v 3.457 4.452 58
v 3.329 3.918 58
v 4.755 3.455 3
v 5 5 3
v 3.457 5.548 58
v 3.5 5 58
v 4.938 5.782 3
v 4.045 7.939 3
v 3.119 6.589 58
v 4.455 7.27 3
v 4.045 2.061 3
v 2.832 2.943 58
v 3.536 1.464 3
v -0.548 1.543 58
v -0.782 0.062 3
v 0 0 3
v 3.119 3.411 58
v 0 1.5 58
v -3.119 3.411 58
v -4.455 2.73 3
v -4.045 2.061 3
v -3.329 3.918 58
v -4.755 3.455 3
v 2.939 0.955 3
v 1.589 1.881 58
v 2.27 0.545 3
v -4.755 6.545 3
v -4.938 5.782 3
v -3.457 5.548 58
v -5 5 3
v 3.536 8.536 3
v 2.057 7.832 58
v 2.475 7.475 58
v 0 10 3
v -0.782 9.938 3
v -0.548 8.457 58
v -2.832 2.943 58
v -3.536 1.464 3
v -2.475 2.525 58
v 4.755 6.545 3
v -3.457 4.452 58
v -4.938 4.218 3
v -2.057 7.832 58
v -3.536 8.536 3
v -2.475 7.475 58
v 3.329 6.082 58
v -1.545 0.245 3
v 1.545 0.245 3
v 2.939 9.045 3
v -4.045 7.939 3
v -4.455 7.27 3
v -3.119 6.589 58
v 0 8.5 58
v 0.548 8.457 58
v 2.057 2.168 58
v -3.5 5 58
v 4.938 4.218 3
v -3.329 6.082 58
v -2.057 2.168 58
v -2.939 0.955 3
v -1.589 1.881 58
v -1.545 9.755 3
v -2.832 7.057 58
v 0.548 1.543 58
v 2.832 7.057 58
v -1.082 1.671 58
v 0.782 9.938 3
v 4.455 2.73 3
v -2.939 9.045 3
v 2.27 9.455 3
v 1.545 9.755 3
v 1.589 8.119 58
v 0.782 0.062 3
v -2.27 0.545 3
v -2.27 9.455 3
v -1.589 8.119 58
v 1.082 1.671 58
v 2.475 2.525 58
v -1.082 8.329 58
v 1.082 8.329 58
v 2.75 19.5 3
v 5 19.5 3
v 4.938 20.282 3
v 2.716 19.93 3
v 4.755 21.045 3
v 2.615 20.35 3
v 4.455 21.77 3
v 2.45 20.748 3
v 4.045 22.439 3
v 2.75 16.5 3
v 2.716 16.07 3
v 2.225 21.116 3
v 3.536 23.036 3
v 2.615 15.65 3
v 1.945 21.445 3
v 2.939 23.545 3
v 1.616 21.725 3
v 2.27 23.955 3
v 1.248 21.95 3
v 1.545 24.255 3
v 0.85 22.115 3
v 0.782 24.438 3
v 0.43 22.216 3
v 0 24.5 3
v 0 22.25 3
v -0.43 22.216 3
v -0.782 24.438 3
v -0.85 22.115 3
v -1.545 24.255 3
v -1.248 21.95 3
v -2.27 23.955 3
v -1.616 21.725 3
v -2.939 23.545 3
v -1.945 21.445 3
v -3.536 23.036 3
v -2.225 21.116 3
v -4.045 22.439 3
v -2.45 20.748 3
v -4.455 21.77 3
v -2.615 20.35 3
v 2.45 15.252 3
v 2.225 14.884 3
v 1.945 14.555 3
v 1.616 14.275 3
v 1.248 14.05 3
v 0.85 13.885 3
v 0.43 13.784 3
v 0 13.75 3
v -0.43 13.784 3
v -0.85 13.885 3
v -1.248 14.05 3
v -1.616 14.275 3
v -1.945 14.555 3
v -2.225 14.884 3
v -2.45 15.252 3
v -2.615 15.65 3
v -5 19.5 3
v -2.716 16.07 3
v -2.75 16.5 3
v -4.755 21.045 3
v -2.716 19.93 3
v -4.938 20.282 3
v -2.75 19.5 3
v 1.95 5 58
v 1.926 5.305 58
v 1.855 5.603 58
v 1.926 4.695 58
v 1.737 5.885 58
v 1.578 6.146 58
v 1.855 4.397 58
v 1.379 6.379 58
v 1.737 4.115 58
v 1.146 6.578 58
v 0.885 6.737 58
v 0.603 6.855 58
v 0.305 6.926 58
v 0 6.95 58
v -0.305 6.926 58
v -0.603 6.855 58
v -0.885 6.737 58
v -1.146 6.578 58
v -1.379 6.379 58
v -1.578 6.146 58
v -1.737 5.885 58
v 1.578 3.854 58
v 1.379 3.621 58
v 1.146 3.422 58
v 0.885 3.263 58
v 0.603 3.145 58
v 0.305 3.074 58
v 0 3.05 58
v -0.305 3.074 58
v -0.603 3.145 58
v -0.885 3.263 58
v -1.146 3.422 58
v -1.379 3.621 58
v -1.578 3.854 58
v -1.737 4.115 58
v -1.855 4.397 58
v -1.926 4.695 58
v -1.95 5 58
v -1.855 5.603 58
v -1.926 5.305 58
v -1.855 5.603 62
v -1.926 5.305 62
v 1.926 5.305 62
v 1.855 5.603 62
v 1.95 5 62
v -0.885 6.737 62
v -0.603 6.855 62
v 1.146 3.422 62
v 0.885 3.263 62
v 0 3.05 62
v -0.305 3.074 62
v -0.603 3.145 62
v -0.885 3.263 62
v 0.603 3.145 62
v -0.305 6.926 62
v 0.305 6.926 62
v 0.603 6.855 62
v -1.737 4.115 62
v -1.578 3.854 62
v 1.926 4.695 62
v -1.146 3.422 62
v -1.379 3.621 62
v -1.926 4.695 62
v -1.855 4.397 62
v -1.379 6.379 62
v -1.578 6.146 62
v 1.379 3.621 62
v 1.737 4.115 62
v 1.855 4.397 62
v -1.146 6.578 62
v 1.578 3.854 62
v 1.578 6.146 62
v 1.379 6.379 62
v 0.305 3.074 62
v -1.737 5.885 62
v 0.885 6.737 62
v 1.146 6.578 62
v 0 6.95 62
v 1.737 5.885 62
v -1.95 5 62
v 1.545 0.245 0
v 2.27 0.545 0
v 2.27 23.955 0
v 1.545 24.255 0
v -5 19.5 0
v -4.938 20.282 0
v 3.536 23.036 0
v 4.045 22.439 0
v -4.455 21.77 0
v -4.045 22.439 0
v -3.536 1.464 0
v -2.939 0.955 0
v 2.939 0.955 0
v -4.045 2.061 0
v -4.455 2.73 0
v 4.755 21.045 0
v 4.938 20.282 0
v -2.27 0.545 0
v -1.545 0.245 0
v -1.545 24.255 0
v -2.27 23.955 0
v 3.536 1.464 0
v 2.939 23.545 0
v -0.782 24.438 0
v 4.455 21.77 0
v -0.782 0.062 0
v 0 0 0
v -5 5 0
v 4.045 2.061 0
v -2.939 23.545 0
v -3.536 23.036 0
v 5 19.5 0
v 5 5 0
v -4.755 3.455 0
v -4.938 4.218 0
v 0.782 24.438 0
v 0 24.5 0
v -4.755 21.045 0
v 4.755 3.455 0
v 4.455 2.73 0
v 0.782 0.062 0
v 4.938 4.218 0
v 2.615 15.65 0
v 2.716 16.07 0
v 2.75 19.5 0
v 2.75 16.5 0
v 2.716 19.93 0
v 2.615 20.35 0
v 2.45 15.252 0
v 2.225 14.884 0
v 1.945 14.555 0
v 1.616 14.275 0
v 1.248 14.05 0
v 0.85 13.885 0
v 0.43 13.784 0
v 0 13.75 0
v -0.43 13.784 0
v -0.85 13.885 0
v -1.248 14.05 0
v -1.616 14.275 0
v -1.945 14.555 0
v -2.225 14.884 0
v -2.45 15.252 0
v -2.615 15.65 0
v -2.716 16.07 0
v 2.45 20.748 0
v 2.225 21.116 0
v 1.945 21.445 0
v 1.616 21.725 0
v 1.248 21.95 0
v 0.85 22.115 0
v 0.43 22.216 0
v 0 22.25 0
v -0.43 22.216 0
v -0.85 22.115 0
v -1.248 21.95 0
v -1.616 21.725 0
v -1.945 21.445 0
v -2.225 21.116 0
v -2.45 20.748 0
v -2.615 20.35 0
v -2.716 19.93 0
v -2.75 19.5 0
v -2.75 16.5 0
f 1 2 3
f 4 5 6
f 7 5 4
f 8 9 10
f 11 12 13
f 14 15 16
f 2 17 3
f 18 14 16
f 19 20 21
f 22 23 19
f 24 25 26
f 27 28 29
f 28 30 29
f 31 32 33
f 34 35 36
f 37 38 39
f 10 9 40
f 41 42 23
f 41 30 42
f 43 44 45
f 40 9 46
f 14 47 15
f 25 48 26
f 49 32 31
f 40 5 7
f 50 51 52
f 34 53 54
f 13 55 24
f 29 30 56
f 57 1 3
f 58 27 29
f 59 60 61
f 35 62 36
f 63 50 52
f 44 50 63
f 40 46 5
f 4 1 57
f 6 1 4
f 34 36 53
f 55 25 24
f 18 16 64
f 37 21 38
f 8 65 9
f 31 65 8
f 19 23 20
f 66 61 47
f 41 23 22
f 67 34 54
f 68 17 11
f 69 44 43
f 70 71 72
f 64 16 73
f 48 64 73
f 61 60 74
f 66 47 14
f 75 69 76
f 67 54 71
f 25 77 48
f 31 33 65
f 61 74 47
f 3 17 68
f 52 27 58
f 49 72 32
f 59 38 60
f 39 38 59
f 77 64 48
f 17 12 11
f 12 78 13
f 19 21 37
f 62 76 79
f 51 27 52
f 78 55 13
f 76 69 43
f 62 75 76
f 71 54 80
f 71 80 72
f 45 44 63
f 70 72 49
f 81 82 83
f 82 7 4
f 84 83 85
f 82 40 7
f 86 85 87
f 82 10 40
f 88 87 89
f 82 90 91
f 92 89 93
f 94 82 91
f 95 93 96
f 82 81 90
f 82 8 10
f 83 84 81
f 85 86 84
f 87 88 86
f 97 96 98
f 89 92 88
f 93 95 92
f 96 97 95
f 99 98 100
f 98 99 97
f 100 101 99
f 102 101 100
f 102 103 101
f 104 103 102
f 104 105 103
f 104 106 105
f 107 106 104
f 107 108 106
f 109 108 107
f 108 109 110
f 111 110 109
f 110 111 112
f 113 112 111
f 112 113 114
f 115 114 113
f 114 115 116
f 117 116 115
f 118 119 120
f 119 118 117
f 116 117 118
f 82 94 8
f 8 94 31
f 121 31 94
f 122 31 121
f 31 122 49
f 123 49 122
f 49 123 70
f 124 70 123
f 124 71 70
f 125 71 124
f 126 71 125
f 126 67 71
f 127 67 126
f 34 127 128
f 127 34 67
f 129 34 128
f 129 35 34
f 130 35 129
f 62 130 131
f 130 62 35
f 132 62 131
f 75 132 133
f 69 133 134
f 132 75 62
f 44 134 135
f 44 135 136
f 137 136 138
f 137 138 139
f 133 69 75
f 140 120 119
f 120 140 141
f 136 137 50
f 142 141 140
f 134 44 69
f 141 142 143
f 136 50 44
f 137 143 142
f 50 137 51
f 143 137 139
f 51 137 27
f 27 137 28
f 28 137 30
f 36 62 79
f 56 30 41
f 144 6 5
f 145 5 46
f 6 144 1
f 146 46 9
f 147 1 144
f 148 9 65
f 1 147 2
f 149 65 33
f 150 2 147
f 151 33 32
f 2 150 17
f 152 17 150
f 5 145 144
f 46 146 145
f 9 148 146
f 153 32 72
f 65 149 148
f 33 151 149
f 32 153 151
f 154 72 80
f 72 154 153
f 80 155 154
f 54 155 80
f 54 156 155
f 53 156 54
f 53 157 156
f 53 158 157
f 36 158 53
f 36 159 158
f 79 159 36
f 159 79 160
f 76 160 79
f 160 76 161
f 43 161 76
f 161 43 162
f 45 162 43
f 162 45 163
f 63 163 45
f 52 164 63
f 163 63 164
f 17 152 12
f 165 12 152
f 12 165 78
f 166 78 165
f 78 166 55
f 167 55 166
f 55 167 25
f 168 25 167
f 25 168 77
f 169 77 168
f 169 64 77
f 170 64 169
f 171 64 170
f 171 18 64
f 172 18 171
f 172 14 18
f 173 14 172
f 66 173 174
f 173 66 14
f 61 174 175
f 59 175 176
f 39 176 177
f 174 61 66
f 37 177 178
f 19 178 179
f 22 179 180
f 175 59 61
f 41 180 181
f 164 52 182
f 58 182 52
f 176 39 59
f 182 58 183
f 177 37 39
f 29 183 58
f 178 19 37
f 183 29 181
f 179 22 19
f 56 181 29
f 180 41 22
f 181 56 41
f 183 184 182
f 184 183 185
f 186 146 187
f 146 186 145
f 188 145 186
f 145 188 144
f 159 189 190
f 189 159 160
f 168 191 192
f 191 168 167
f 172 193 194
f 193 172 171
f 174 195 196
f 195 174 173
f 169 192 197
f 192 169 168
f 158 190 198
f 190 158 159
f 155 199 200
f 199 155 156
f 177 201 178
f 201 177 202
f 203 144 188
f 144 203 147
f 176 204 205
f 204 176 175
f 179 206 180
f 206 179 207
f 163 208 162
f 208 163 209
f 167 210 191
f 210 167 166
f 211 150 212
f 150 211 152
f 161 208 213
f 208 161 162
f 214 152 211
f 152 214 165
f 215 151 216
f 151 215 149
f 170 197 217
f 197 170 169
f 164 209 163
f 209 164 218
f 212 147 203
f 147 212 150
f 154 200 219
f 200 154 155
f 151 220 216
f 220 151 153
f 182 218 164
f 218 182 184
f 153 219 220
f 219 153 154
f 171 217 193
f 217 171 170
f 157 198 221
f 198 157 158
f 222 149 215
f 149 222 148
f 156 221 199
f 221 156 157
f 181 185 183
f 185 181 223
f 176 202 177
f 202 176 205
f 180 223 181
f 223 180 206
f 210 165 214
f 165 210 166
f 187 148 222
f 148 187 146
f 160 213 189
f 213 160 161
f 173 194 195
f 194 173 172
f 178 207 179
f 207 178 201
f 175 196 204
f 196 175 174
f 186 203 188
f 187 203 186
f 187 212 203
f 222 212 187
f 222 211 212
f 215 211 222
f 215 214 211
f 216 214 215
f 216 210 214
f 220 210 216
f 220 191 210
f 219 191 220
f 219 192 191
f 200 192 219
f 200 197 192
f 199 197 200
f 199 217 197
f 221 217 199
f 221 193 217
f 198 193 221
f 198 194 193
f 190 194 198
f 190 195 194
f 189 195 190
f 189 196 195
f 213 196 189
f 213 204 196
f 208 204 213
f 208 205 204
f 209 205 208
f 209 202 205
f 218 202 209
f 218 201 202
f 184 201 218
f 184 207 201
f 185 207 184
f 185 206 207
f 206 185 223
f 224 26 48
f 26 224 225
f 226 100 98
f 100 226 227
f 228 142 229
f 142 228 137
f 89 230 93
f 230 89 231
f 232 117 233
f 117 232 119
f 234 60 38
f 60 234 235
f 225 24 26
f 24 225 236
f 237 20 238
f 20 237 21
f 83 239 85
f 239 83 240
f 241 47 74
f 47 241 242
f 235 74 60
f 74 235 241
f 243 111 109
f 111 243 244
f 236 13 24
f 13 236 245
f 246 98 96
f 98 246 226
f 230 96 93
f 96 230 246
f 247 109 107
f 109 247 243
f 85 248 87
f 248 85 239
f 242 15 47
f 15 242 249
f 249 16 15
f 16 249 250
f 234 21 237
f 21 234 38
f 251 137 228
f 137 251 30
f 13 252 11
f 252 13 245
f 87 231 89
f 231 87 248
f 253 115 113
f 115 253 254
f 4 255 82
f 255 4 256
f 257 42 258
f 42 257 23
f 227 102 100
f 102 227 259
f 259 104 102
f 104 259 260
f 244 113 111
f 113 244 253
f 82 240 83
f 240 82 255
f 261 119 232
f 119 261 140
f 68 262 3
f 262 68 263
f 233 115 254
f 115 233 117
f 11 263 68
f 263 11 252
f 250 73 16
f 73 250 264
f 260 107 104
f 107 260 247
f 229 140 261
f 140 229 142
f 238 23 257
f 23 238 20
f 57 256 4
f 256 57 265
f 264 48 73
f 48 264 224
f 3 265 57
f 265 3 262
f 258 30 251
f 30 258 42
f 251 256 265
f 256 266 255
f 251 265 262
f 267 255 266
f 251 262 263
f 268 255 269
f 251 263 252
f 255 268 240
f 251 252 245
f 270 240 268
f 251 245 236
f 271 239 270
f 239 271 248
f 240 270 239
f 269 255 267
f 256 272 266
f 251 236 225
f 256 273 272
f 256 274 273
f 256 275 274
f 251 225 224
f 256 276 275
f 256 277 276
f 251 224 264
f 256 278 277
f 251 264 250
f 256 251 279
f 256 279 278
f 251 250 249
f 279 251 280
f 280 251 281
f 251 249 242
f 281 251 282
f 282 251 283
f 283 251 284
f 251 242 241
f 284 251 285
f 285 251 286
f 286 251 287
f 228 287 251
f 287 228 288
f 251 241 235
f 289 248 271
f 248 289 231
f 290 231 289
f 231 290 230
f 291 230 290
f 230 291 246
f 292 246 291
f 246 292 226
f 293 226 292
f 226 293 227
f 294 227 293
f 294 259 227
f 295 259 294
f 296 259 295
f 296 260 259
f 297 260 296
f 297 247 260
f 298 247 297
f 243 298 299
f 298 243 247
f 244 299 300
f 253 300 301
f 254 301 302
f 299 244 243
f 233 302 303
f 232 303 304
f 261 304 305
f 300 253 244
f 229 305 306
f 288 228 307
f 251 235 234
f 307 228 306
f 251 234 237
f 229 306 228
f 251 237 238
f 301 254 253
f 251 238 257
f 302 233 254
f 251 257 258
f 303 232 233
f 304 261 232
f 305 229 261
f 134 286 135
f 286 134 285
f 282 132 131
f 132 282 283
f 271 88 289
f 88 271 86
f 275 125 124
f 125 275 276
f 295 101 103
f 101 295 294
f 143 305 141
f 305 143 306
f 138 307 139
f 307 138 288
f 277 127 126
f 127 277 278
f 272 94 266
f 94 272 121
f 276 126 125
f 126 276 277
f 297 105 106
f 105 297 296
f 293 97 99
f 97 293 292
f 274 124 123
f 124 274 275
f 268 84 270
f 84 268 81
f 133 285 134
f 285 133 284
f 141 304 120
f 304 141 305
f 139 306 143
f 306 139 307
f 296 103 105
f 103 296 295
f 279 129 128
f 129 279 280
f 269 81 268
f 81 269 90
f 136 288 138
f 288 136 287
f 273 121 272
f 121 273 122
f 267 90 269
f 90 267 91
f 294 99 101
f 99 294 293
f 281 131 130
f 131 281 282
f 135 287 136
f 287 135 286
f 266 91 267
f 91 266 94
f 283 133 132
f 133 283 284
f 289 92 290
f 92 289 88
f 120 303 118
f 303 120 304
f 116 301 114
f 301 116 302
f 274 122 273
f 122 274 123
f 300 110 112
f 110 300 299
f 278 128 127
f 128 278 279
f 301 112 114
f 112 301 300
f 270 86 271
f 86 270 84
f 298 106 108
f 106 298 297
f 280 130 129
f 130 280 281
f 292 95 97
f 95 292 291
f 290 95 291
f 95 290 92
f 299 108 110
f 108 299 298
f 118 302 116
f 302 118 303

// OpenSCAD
$fn=40;
hole_mult = 1.1;

post_dia = 7;
post_height = 58;
nub_dia = 3.9;
nub_height = 4;
slot_centre = 13; // From post centre.
slot_dia = 5 * hole_mult;
slot_length = 3; // Centre to centre.
base_width = 10;
base_length = base_width / 2 + 13 + slot_length / 2 + slot_dia / 2 + (base_width - slot_dia) / 2;
size = [base_width, base_length, 3];
difference()
{
	union()
	{
		hull()
		{
			translate([0, size.x / 2, 0])
			cylinder(h = size.z, d = size.x);

			translate([0, size.y - size.x / 2, 0])
			cylinder(h = size.z, d = size.x);
		}
				
		translate([0, size.x / 2, 0])
		{
			translate([0, 0, size.z])
			cylinder(h=post_height - size.z, d1=size.x, d2 = post_dia);

			translate([0, 0, post_height])
			cylinder(h=nub_height, d=nub_dia);
		}
	}

	translate([0, size.x / 2 + slot_centre - slot_length / 2, 0])
	hull()
	{
		cylinder(h=size.z + 1, d=slot_dia);
		
		translate([0, slot_length, 0])
		cylinder(h=size.z + 1, d=slot_dia);
	}	
	
}
